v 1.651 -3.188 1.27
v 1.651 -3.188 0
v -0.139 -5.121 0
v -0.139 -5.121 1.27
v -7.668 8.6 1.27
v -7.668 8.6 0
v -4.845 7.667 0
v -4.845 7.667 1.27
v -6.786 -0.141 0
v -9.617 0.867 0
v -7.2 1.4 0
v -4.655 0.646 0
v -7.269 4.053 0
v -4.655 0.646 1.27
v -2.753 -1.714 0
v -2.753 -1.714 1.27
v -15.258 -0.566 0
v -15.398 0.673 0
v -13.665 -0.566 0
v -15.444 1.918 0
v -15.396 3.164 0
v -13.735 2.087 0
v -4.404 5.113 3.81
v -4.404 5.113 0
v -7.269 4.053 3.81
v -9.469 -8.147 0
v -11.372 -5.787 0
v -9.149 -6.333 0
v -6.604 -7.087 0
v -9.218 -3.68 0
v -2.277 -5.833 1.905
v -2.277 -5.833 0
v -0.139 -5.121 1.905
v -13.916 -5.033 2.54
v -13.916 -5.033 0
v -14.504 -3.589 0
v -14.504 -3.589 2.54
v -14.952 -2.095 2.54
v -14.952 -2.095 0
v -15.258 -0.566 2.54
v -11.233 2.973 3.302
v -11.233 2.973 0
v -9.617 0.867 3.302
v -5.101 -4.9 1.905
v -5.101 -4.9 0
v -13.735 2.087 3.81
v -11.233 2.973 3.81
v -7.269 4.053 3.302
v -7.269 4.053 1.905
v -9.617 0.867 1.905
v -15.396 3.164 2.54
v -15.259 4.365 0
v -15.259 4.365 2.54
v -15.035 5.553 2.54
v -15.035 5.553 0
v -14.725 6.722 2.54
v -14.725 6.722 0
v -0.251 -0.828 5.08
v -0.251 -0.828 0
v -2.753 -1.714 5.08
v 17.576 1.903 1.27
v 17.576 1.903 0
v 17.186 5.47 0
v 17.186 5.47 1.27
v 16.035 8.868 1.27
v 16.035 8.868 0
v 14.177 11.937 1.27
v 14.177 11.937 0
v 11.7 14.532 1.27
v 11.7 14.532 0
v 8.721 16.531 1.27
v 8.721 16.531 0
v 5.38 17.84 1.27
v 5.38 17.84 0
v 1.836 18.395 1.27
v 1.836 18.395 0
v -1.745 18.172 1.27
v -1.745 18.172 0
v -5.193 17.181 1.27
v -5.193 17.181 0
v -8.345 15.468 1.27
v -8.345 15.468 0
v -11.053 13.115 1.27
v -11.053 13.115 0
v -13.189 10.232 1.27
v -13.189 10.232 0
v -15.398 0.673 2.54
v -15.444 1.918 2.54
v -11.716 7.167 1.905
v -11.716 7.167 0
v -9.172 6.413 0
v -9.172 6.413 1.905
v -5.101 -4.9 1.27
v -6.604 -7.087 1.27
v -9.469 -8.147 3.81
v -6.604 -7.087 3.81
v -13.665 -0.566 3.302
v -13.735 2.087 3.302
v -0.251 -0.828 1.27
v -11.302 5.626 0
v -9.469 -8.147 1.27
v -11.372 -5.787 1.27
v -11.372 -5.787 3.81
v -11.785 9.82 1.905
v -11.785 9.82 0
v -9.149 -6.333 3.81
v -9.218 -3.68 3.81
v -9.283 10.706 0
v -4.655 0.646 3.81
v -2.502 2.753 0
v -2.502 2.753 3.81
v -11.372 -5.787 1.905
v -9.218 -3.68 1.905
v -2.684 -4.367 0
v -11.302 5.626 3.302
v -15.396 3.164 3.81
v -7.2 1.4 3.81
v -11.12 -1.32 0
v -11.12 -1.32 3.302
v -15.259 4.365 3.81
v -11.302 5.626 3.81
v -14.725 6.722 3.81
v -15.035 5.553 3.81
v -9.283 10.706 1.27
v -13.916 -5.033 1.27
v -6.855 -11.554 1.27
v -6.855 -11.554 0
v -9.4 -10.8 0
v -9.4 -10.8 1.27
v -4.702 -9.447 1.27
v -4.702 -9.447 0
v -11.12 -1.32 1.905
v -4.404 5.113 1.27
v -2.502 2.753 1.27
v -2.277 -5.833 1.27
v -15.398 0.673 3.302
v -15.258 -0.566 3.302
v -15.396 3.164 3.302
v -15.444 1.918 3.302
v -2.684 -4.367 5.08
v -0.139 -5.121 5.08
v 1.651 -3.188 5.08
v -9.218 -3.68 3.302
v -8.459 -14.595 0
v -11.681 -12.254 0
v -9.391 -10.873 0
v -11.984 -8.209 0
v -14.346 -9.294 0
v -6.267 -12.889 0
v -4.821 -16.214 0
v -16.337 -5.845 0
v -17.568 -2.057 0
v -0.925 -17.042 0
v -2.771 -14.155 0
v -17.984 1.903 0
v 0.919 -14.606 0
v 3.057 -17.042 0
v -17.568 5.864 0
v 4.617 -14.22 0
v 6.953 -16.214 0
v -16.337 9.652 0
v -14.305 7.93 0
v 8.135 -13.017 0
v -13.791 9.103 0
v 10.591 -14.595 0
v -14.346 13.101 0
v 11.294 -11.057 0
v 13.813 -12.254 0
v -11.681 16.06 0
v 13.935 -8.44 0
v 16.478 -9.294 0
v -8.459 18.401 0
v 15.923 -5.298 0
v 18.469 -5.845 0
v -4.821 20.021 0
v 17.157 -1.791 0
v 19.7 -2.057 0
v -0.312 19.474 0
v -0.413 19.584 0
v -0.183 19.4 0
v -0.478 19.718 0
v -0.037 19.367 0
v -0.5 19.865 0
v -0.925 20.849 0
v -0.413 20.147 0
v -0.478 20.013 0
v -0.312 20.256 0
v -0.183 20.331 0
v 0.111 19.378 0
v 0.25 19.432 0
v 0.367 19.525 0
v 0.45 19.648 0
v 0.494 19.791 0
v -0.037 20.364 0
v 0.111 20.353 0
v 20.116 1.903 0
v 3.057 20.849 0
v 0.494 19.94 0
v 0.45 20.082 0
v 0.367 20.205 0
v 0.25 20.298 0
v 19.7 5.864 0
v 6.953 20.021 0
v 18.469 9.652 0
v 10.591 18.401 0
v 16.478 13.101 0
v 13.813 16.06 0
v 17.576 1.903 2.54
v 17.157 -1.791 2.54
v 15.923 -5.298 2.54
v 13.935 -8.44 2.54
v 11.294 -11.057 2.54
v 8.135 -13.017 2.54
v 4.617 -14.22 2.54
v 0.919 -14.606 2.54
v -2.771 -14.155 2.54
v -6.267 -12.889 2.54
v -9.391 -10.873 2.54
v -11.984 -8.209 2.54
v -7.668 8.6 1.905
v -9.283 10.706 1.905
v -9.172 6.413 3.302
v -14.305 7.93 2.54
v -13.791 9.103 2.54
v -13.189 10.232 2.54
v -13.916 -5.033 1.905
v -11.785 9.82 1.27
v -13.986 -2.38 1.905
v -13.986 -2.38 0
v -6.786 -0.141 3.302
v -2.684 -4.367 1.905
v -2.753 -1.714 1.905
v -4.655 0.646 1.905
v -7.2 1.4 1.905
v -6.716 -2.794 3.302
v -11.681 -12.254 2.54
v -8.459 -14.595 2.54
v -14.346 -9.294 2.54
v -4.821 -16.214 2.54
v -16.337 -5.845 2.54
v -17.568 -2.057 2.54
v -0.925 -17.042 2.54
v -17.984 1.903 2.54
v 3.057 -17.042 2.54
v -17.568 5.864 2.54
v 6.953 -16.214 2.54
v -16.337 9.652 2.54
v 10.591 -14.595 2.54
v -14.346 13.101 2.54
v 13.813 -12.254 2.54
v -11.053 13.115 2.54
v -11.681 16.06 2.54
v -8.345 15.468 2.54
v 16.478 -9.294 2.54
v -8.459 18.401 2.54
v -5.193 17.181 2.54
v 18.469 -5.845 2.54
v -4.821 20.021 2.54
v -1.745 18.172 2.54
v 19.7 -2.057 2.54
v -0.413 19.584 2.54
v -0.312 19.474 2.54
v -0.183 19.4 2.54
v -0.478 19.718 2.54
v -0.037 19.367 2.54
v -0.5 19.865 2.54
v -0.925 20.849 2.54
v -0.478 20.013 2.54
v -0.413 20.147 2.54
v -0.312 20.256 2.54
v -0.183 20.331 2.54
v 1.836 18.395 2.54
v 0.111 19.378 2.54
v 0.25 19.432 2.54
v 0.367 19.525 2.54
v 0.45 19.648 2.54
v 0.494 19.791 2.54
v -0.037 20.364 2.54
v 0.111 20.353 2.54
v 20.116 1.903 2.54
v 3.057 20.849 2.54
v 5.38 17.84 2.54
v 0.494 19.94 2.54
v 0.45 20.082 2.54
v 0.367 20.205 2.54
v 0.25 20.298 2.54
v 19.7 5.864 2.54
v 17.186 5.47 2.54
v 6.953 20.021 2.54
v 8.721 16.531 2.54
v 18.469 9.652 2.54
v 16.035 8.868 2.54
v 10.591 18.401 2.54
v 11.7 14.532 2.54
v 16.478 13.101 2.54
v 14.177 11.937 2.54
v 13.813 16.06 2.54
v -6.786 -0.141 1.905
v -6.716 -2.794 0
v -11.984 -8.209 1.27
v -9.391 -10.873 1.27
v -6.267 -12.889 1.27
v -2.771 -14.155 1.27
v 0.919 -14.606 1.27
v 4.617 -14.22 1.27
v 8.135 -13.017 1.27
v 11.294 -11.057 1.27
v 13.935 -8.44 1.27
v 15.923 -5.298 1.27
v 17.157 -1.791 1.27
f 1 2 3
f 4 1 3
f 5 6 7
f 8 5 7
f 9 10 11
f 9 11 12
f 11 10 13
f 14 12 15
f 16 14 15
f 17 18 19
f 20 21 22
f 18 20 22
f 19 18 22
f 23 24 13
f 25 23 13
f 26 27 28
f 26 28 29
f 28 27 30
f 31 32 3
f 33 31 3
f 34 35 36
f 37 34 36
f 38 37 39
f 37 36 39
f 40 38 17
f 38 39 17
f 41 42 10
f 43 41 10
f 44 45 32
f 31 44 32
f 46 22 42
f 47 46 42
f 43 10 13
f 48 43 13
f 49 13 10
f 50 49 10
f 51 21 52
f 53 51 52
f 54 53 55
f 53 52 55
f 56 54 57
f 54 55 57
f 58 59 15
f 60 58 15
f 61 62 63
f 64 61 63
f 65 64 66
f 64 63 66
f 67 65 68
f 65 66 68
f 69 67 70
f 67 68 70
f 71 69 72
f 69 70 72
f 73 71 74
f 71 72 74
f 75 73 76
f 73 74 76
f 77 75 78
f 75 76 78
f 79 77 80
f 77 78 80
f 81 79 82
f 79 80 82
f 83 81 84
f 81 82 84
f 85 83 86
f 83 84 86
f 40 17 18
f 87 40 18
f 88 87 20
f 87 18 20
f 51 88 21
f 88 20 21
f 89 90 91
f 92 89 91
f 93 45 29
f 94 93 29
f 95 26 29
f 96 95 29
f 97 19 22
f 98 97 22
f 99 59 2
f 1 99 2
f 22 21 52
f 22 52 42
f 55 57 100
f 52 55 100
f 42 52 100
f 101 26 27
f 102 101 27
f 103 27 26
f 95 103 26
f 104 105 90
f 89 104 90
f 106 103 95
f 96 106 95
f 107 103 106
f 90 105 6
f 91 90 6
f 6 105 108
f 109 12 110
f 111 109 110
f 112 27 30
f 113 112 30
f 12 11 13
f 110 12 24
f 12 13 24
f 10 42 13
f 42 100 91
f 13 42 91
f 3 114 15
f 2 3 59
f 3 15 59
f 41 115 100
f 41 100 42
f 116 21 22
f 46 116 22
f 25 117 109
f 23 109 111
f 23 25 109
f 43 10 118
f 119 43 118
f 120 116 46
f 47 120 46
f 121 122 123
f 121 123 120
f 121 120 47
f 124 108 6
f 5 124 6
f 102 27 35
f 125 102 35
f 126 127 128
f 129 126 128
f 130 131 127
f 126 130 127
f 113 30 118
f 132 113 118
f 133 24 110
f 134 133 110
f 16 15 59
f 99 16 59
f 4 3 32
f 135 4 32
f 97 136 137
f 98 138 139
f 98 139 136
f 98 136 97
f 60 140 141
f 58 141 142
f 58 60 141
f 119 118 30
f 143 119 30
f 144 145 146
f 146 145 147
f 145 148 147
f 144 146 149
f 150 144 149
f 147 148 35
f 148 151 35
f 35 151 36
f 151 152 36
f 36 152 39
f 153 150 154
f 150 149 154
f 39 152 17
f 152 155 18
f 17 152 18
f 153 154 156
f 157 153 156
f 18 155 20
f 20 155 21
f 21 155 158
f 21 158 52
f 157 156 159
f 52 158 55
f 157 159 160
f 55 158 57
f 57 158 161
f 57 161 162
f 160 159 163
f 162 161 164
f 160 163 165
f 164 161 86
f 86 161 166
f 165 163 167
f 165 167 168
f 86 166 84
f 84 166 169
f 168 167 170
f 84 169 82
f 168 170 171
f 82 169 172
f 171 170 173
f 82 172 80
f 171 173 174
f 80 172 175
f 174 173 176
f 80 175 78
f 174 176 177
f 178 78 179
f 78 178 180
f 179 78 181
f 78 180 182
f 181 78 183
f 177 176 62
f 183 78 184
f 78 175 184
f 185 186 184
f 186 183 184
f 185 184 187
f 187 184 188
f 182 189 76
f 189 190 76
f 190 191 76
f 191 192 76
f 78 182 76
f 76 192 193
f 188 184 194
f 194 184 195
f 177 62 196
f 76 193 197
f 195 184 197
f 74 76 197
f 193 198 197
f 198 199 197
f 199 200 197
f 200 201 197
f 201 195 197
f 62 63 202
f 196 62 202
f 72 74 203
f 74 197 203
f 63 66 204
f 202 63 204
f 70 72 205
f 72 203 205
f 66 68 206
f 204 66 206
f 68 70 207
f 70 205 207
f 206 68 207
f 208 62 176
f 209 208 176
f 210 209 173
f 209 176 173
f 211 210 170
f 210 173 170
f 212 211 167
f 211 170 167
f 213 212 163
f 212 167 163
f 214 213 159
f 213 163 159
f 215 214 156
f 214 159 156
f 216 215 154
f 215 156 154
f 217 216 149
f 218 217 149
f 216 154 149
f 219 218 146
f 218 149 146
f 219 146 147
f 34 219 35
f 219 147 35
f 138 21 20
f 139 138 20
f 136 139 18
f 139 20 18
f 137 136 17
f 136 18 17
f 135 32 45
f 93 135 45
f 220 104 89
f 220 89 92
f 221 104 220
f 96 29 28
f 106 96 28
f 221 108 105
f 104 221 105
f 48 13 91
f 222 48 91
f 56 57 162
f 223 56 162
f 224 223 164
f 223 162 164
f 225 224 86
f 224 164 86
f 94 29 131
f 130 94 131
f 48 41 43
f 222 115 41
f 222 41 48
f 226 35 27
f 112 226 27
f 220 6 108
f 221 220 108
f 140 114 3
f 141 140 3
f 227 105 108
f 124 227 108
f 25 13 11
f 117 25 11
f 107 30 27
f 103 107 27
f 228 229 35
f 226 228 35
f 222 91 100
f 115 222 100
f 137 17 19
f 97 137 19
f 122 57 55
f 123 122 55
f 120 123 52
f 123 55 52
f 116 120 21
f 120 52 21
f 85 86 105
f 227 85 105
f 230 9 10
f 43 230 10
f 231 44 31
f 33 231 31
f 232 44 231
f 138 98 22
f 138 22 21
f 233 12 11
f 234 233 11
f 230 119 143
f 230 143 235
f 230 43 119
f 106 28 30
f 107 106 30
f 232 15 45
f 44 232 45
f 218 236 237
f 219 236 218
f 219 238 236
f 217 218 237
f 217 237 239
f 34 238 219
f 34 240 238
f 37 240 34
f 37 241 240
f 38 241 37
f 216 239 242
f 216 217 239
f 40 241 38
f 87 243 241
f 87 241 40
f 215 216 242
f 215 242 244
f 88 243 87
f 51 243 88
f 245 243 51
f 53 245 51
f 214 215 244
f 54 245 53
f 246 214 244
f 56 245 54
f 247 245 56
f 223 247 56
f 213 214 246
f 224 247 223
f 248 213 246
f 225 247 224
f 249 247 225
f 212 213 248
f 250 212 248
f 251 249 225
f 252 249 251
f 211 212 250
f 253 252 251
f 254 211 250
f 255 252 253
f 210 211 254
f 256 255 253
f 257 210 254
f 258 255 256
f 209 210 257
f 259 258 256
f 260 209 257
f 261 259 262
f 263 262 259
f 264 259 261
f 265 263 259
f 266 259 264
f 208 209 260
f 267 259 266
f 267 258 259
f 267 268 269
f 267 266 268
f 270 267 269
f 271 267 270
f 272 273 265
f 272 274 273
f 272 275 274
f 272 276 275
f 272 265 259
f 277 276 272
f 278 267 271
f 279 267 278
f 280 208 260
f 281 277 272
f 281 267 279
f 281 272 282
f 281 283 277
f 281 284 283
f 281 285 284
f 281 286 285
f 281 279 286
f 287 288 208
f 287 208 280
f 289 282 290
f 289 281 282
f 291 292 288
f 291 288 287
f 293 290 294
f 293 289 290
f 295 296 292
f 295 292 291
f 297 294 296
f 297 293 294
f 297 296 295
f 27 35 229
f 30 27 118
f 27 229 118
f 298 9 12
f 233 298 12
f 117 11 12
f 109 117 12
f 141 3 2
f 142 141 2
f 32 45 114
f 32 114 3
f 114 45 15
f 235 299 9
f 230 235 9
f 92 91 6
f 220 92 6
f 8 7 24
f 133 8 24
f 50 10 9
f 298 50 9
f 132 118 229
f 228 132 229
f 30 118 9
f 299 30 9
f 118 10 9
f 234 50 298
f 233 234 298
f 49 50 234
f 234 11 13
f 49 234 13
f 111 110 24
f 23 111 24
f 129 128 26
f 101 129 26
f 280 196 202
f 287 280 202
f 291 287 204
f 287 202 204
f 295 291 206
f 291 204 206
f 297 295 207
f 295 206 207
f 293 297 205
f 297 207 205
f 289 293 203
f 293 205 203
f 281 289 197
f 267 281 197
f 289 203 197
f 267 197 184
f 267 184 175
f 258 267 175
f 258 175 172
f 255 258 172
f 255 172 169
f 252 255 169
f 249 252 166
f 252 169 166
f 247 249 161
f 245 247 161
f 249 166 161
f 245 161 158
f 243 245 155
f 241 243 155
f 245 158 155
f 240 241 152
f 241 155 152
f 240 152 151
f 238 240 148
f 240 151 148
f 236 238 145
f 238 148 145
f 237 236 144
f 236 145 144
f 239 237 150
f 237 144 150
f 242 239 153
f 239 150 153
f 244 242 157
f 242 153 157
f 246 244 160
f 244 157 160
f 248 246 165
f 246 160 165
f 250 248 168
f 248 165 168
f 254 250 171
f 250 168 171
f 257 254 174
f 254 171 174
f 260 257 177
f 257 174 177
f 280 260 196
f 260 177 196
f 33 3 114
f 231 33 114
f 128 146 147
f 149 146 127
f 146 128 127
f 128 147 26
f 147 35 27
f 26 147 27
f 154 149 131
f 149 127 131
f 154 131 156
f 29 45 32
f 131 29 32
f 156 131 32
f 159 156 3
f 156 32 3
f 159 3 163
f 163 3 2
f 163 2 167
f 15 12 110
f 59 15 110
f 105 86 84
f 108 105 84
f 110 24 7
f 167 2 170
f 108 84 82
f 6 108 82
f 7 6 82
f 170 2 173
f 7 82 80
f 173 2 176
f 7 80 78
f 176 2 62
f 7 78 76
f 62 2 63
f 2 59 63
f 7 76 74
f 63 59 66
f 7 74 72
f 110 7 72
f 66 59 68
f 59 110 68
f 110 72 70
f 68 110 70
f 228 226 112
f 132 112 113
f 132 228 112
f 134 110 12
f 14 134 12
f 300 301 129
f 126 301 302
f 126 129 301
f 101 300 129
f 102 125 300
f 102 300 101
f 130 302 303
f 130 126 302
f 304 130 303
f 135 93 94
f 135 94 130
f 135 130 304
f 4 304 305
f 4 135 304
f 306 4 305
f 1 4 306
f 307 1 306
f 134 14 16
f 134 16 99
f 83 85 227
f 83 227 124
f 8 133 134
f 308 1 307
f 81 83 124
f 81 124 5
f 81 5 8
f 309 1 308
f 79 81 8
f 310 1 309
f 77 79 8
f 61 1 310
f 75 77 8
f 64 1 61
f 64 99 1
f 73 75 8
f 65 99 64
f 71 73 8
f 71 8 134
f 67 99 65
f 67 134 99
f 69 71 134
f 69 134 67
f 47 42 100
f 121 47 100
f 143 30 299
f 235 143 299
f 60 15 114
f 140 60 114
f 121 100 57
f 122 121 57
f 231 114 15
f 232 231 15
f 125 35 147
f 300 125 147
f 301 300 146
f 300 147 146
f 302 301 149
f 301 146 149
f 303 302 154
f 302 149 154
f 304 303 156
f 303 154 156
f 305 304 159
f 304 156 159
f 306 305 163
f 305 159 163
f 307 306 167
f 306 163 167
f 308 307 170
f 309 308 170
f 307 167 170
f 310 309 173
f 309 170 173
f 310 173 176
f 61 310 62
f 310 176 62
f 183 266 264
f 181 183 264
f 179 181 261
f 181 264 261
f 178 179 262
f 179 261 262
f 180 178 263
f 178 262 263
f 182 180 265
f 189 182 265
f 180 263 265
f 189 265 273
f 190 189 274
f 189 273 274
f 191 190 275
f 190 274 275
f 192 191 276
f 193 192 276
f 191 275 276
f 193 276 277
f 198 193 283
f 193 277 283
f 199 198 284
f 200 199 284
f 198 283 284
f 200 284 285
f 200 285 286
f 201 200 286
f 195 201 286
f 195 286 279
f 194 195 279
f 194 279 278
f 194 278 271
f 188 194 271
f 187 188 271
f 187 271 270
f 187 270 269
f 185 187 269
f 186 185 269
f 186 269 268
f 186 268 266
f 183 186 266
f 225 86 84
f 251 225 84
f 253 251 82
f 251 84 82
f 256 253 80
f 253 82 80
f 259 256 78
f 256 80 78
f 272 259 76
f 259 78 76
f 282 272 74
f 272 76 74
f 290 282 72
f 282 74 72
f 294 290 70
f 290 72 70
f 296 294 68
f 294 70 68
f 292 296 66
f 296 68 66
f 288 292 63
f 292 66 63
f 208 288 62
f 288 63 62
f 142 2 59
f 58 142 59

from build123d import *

# Parameters (mm, degrees)
F0_R     = 19.05
F1_DEPTH = 2.54
F2_DEPTH = 3.81
F3_DEPTH = 1.905
F4_DEPTH = 1.27
F5_DEPTH = 5.08
F6_DEPTH = 3.302
F8_D     = 1


# Not quite as in the source:
# - ends of sketch curves that miss each other by under 0.0002 mm in the source are joined


with BuildPart() as f1:
    # F0 (on Top) → F1 (new body)
    with BuildSketch(Plane.XY):
        with Locations((1.0659972724, 1.9032299986)):
            Circle(F0_R)
        with BuildLine():
            ThreePointArc((-13.1891179301, 10.2322029584), (5.3804003601, 17.8395415542), (17.5759972724, 1.9032299986))
            ThreePointArc((17.5759972724, 1.9032299986), (4.617214022, -14.2203229472), (-13.9163055256, -5.032957922))
            ThreePointArc((-13.9163055256, -5.032957922), (-14.7457872718, -2.8473036059), (-15.2582489012, -0.5664029427))
            ThreePointArc((-15.2582489012, -0.5664029427), (-15.4327964499, 1.2950312559), (-15.3957733388, 3.1642646312))
            ThreePointArc((-15.3957733388, 3.1642646312), (-15.1582970549, 4.9613950667), (-14.7252297792, 6.7216579795))
            ThreePointArc((-14.7252297792, 6.7216579795), (-14.0593672595, 8.5216473152), (-13.1891179301, 10.2322029584))
        make_face(mode=Mode.SUBTRACT)
    extrude(amount=F1_DEPTH)

    # F8 (through all)
    with Locations(Plane(origin=(0, 0, 0), x_dir=(1, 0, 0), z_dir=(0, 0, -1))):
        with Locations((0, -19.865270704)):
            Hole(F8_D / 2)


with BuildPart() as f2:
    # F0 (on Top) → F2 (new body)
    with BuildSketch(Plane.XY):
        Polygon((-4.4041624778, 5.1126668811), (-7.2693862148, 4.0531819443), (-7.2, 1.4), (-4.6552325034, 0.6461119018), (-2.5020106636, 2.7526948456), align=None)
    extrude(amount=F2_DEPTH)


with BuildPart() as f2b:
    # F0 (on Top) → F2, piece 2 (new body)
    with BuildSketch(Plane.XY):
        with BuildLine():
            Line((-11.3021234722, 5.6258294676), (-14.7252297792, 6.7216579795))
            ThreePointArc((-14.7252297792, 6.7216579795), (-15.1582970549, 4.9613950667), (-15.3957733388, 3.1642646312))
            Line((-15.3957733388, 3.1642646312), (-13.7346217148, 2.0867790016))
            Line((-13.7346217148, 2.0867790016), (-11.2327372573, 2.9726475233))
            Line((-11.2327372573, 2.9726475233), (-11.3021234722, 5.6258294676))
        make_face()
    extrude(amount=F2_DEPTH)


with BuildPart() as f2c:
    # F0 (on Top) → F2, piece 3 (new body)
    with BuildSketch(Plane.XY):
        Polygon((-9.2183161892, -3.6802630764), (-11.371538029, -5.7868460202), (-9.4693862148, -8.1468180557), (-6.6041624778, -7.0873331189), (-9.1489299744, -6.3334450207), align=None)
    extrude(amount=F2_DEPTH)


with BuildPart() as f3:
    # F0 (on Top) → F3 (new body)
    with BuildSketch(Plane.XY):
        Polygon((-7.2693862148, 4.0531819443), (-9.6171014119, 0.866962435), (-6.7858179466, -0.1412126104), (-4.6552325034, 0.6461119018), (-7.2, 1.4), align=None)
    extrude(amount=F3_DEPTH)


with BuildPart() as f3b:
    # F0 (on Top) → F3, piece 2 (new body)
    with BuildSketch(Plane.XY):
        Polygon((-13.9856917404, -2.3797759777), (-13.9163055256, -5.032957922), (-11.371538029, -5.7868460202), (-9.2183161892, -3.6802630764), (-11.1204680034, -1.3202910409), align=None)
    extrude(amount=F3_DEPTH)


with BuildPart() as f3c:
    # F0 (on Top) → F3, piece 3 (new body)
    with BuildSketch(Plane.XY):
        Polygon((-9.2834670883, 10.7059926791), (-11.7853515458, 9.8201241574), (-11.7159653309, 7.1669422131), (-9.171538029, 6.4131539798), (-7.6681714375, 8.6004074557), (-7.6678349877, 8.6002962598), align=None)
    extrude(amount=F3_DEPTH)


with BuildPart() as f3d:
    # F0 (on Top) → F3, piece 4 (new body)
    with BuildSketch(Plane.XY):
        Polygon((-2.7530806892, -1.7138601337), (-5.1007958863, -4.900079643), (-2.2774721557, -5.8331822828), (-0.1389269778, -5.1209301762), (-2.6836944744, -4.367042078), align=None)
    extrude(amount=F3_DEPTH)


with BuildPart() as f4:
    # F0 (on Top) → F4 (new body)
    with BuildSketch(Plane.XY):
        with BuildLine():
            ThreePointArc((-13.9163055256, -5.032957922), (4.617214022, -14.2203229472), (17.5759972724, 1.9032299986))
            ThreePointArc((17.5759972724, 1.9032299986), (5.3804003601, 17.8395415542), (-13.1891179301, 10.2322029584))
            Line((-13.1891179301, 10.2322029584), (-11.7853515458, 9.8201241574))
            Line((-11.7853515458, 9.8201241574), (-9.2834670883, 10.7059926791))
            Line((-9.2834670883, 10.7059926791), (-7.6678312428, 8.6003075908))
            Line((-7.6678312428, 8.6003075908), (-4.8448477069, 7.6673048159))
            Line((-4.8448477069, 7.6673048159), (-4.4041624778, 5.1126668811))
            Line((-4.4041624778, 5.1126668811), (-2.5020106636, 2.7526948456))
            Line((-2.5020106636, 2.7526948456), (-4.6552325034, 0.6461119018))
            Line((-4.6552325034, 0.6461119018), (-2.7530806892, -1.7138601337))
            Line((-2.7530806892, -1.7138601337), (-0.2511962318, -0.827991612))
            Line((-0.2511962318, -0.827991612), (1.6509555824, -3.1879636476))
            Line((1.6509555824, -3.1879636476), (-0.1389269778, -5.1209301762))
            Line((-0.1389269778, -5.1209301762), (-2.2774721557, -5.8331822828))
            Line((-2.2774721557, -5.8331822828), (-5.1007958863, -4.900079643))
            Line((-5.1007958863, -4.900079643), (-6.6041624778, -7.0873331189))
            Line((-6.6041624778, -7.0873331189), (-4.7020106636, -9.4473051544))
            Line((-4.7020106636, -9.4473051544), (-6.8552325034, -11.5538880982))
            Line((-6.8552325034, -11.5538880982), (-9.4, -10.8))
            Line((-9.4, -10.8), (-9.4693862148, -8.1468180557))
            Line((-9.4693862148, -8.1468180557), (-11.371538029, -5.7868460202))
            Line((-11.371538029, -5.7868460202), (-13.9163055256, -5.032957922))
        make_face()
    extrude(amount=F4_DEPTH)


with BuildPart() as f5:
    # F0 (on Top) → F5 (new body)
    with BuildSketch(Plane.XY):
        Polygon((-0.2511962318, -0.827991612), (-2.7530806892, -1.7138601337), (-2.6836944744, -4.367042078), (-0.1389269778, -5.1209301762), (1.6509555824, -3.1879636476), align=None)
    extrude(amount=F5_DEPTH)


with BuildPart() as f6:
    # F0 (on Top) → F6 (new body)
    with BuildSketch(Plane.XY):
        Polygon((-9.171538029, 6.4131539798), (-11.3021234722, 5.6258294676), (-11.2327372573, 2.9726475233), (-9.6171014119, 0.866962435), (-7.2693862148, 4.0531819443), align=None)
    extrude(amount=F6_DEPTH)


with BuildPart() as f6b:
    # F0 (on Top) → F6, piece 2 (new body)
    with BuildSketch(Plane.XY):
        Polygon((-11.1204680034, -1.3202910409), (-9.2183161892, -3.6802630764), (-6.7164317317, -2.7943945547), (-6.7858179466, -0.1412126104), (-9.6171014119, 0.866962435), align=None)
    extrude(amount=F6_DEPTH)


with BuildPart() as f6c:
    # F0 (on Top) → F6, piece 3 (new body)
    with BuildSketch(Plane.XY):
        with BuildLine():
            ThreePointArc((-15.3957733388, 3.1642646312), (-15.4327964499, 1.2950312559), (-15.2582489012, -0.5664029427))
            Line((-15.2582489012, -0.5664029427), (-13.6652355, -0.5664029427))
            Line((-13.6652355, -0.5664029427), (-13.7346217148, 2.0867790016))
            Line((-13.7346217148, 2.0867790016), (-15.3957733388, 3.1642646312))
        make_face()
    extrude(amount=F6_DEPTH)


solid = Compound([f1.part, f2.part, f2b.part, f2c.part, f3.part, f3b.part, f3c.part, f3d.part, f4.part, f5.part, f6.part, f6b.part, f6c.part])
